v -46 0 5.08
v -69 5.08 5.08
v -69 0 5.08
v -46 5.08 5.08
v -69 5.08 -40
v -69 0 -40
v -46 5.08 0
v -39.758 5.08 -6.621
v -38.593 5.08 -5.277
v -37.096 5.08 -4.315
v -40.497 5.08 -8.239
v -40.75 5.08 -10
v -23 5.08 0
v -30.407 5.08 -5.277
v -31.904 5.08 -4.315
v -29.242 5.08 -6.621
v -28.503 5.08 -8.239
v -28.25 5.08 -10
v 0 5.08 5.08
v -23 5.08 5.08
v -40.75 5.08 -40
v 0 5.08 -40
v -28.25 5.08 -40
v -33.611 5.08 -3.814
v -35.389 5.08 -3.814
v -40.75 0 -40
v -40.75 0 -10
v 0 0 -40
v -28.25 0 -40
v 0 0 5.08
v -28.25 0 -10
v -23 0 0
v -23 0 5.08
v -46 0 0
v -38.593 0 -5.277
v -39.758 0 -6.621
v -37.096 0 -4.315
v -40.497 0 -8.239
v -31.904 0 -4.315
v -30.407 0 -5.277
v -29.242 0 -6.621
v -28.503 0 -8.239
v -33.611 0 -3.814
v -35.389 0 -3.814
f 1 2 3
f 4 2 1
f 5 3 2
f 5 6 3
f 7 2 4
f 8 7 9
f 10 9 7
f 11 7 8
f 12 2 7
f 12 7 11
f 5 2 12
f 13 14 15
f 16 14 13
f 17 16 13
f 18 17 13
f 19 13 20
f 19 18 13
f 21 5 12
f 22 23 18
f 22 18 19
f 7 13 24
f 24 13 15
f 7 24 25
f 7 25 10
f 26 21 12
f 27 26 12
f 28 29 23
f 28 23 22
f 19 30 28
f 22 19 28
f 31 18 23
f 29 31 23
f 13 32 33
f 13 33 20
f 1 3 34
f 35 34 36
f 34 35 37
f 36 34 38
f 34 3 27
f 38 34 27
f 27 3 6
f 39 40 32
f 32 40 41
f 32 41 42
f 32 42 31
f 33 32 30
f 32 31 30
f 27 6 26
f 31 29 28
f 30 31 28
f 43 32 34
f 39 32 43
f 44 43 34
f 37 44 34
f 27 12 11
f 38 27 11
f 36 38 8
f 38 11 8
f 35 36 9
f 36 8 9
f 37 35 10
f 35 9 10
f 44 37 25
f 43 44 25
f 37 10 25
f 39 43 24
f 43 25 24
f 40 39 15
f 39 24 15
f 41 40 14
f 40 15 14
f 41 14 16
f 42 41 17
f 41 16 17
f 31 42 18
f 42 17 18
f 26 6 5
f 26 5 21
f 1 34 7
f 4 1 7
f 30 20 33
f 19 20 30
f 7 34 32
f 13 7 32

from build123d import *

# Parameters (mm, degrees)
SKETCH1_W           = 69
SKETCH1_H           = 40
BOSS_EXTRUDE1_DEPTH = 5.08
SKETCH2_W           = 23
SKETCH2_H           = 5.08
BOSS_EXTRUDE2_DEPTH = 5.08
CUT_EXTRUDE4_DEPTH  = 5.08


with BuildPart() as part:
    # Sketch1 → Boss-Extrude1 (new body)
    with BuildSketch(Plane(origin=(0, 0, 0), x_dir=(1, 0, 0), z_dir=(0, 1, 0))):
        with Locations((-34.5, 20)):
            Rectangle(SKETCH1_W, SKETCH1_H)
    extrude(amount=BOSS_EXTRUDE1_DEPTH)

    # Sketch2 → Boss-Extrude2 (add)
    with BuildSketch(Plane.XY):
        with Locations((-57.5, 2.54)):
            Rectangle(SKETCH2_W, SKETCH2_H)
        with Locations((-11.5, 2.54)):
            Rectangle(SKETCH2_W, SKETCH2_H)
    extrude(amount=BOSS_EXTRUDE2_DEPTH)

    # Sketch7 → Cut-Extrude4 (cut)
    with BuildSketch(Plane(origin=(0, 5.08, 0), x_dir=(1, 0, 0), z_dir=(0, 1, 0))):
        with BuildLine():
            ThreePointArc((-28.25, 10), (-34.5, 16.25), (-40.75, 10))
            Line((-40.75, 10), (-28.25, 10))
        make_face()
        with BuildLine():
            Line((-28.25, 10), (-40.75, 10))
            ThreePointArc((-40.75, 10), (-34.5, 3.75), (-28.25, 10))
        make_face()
        with BuildLine():
            Line((-40.75, 40), (-40.75, 10))
            ThreePointArc((-40.75, 10), (-34.5, 16.25), (-28.25, 10))
            Line((-28.25, 10), (-28.25, 40))
            Line((-28.25, 40), (-40.75, 40))
        make_face()
    extrude(amount=-CUT_EXTRUDE4_DEPTH, mode=Mode.SUBTRACT)


solid = part.part
